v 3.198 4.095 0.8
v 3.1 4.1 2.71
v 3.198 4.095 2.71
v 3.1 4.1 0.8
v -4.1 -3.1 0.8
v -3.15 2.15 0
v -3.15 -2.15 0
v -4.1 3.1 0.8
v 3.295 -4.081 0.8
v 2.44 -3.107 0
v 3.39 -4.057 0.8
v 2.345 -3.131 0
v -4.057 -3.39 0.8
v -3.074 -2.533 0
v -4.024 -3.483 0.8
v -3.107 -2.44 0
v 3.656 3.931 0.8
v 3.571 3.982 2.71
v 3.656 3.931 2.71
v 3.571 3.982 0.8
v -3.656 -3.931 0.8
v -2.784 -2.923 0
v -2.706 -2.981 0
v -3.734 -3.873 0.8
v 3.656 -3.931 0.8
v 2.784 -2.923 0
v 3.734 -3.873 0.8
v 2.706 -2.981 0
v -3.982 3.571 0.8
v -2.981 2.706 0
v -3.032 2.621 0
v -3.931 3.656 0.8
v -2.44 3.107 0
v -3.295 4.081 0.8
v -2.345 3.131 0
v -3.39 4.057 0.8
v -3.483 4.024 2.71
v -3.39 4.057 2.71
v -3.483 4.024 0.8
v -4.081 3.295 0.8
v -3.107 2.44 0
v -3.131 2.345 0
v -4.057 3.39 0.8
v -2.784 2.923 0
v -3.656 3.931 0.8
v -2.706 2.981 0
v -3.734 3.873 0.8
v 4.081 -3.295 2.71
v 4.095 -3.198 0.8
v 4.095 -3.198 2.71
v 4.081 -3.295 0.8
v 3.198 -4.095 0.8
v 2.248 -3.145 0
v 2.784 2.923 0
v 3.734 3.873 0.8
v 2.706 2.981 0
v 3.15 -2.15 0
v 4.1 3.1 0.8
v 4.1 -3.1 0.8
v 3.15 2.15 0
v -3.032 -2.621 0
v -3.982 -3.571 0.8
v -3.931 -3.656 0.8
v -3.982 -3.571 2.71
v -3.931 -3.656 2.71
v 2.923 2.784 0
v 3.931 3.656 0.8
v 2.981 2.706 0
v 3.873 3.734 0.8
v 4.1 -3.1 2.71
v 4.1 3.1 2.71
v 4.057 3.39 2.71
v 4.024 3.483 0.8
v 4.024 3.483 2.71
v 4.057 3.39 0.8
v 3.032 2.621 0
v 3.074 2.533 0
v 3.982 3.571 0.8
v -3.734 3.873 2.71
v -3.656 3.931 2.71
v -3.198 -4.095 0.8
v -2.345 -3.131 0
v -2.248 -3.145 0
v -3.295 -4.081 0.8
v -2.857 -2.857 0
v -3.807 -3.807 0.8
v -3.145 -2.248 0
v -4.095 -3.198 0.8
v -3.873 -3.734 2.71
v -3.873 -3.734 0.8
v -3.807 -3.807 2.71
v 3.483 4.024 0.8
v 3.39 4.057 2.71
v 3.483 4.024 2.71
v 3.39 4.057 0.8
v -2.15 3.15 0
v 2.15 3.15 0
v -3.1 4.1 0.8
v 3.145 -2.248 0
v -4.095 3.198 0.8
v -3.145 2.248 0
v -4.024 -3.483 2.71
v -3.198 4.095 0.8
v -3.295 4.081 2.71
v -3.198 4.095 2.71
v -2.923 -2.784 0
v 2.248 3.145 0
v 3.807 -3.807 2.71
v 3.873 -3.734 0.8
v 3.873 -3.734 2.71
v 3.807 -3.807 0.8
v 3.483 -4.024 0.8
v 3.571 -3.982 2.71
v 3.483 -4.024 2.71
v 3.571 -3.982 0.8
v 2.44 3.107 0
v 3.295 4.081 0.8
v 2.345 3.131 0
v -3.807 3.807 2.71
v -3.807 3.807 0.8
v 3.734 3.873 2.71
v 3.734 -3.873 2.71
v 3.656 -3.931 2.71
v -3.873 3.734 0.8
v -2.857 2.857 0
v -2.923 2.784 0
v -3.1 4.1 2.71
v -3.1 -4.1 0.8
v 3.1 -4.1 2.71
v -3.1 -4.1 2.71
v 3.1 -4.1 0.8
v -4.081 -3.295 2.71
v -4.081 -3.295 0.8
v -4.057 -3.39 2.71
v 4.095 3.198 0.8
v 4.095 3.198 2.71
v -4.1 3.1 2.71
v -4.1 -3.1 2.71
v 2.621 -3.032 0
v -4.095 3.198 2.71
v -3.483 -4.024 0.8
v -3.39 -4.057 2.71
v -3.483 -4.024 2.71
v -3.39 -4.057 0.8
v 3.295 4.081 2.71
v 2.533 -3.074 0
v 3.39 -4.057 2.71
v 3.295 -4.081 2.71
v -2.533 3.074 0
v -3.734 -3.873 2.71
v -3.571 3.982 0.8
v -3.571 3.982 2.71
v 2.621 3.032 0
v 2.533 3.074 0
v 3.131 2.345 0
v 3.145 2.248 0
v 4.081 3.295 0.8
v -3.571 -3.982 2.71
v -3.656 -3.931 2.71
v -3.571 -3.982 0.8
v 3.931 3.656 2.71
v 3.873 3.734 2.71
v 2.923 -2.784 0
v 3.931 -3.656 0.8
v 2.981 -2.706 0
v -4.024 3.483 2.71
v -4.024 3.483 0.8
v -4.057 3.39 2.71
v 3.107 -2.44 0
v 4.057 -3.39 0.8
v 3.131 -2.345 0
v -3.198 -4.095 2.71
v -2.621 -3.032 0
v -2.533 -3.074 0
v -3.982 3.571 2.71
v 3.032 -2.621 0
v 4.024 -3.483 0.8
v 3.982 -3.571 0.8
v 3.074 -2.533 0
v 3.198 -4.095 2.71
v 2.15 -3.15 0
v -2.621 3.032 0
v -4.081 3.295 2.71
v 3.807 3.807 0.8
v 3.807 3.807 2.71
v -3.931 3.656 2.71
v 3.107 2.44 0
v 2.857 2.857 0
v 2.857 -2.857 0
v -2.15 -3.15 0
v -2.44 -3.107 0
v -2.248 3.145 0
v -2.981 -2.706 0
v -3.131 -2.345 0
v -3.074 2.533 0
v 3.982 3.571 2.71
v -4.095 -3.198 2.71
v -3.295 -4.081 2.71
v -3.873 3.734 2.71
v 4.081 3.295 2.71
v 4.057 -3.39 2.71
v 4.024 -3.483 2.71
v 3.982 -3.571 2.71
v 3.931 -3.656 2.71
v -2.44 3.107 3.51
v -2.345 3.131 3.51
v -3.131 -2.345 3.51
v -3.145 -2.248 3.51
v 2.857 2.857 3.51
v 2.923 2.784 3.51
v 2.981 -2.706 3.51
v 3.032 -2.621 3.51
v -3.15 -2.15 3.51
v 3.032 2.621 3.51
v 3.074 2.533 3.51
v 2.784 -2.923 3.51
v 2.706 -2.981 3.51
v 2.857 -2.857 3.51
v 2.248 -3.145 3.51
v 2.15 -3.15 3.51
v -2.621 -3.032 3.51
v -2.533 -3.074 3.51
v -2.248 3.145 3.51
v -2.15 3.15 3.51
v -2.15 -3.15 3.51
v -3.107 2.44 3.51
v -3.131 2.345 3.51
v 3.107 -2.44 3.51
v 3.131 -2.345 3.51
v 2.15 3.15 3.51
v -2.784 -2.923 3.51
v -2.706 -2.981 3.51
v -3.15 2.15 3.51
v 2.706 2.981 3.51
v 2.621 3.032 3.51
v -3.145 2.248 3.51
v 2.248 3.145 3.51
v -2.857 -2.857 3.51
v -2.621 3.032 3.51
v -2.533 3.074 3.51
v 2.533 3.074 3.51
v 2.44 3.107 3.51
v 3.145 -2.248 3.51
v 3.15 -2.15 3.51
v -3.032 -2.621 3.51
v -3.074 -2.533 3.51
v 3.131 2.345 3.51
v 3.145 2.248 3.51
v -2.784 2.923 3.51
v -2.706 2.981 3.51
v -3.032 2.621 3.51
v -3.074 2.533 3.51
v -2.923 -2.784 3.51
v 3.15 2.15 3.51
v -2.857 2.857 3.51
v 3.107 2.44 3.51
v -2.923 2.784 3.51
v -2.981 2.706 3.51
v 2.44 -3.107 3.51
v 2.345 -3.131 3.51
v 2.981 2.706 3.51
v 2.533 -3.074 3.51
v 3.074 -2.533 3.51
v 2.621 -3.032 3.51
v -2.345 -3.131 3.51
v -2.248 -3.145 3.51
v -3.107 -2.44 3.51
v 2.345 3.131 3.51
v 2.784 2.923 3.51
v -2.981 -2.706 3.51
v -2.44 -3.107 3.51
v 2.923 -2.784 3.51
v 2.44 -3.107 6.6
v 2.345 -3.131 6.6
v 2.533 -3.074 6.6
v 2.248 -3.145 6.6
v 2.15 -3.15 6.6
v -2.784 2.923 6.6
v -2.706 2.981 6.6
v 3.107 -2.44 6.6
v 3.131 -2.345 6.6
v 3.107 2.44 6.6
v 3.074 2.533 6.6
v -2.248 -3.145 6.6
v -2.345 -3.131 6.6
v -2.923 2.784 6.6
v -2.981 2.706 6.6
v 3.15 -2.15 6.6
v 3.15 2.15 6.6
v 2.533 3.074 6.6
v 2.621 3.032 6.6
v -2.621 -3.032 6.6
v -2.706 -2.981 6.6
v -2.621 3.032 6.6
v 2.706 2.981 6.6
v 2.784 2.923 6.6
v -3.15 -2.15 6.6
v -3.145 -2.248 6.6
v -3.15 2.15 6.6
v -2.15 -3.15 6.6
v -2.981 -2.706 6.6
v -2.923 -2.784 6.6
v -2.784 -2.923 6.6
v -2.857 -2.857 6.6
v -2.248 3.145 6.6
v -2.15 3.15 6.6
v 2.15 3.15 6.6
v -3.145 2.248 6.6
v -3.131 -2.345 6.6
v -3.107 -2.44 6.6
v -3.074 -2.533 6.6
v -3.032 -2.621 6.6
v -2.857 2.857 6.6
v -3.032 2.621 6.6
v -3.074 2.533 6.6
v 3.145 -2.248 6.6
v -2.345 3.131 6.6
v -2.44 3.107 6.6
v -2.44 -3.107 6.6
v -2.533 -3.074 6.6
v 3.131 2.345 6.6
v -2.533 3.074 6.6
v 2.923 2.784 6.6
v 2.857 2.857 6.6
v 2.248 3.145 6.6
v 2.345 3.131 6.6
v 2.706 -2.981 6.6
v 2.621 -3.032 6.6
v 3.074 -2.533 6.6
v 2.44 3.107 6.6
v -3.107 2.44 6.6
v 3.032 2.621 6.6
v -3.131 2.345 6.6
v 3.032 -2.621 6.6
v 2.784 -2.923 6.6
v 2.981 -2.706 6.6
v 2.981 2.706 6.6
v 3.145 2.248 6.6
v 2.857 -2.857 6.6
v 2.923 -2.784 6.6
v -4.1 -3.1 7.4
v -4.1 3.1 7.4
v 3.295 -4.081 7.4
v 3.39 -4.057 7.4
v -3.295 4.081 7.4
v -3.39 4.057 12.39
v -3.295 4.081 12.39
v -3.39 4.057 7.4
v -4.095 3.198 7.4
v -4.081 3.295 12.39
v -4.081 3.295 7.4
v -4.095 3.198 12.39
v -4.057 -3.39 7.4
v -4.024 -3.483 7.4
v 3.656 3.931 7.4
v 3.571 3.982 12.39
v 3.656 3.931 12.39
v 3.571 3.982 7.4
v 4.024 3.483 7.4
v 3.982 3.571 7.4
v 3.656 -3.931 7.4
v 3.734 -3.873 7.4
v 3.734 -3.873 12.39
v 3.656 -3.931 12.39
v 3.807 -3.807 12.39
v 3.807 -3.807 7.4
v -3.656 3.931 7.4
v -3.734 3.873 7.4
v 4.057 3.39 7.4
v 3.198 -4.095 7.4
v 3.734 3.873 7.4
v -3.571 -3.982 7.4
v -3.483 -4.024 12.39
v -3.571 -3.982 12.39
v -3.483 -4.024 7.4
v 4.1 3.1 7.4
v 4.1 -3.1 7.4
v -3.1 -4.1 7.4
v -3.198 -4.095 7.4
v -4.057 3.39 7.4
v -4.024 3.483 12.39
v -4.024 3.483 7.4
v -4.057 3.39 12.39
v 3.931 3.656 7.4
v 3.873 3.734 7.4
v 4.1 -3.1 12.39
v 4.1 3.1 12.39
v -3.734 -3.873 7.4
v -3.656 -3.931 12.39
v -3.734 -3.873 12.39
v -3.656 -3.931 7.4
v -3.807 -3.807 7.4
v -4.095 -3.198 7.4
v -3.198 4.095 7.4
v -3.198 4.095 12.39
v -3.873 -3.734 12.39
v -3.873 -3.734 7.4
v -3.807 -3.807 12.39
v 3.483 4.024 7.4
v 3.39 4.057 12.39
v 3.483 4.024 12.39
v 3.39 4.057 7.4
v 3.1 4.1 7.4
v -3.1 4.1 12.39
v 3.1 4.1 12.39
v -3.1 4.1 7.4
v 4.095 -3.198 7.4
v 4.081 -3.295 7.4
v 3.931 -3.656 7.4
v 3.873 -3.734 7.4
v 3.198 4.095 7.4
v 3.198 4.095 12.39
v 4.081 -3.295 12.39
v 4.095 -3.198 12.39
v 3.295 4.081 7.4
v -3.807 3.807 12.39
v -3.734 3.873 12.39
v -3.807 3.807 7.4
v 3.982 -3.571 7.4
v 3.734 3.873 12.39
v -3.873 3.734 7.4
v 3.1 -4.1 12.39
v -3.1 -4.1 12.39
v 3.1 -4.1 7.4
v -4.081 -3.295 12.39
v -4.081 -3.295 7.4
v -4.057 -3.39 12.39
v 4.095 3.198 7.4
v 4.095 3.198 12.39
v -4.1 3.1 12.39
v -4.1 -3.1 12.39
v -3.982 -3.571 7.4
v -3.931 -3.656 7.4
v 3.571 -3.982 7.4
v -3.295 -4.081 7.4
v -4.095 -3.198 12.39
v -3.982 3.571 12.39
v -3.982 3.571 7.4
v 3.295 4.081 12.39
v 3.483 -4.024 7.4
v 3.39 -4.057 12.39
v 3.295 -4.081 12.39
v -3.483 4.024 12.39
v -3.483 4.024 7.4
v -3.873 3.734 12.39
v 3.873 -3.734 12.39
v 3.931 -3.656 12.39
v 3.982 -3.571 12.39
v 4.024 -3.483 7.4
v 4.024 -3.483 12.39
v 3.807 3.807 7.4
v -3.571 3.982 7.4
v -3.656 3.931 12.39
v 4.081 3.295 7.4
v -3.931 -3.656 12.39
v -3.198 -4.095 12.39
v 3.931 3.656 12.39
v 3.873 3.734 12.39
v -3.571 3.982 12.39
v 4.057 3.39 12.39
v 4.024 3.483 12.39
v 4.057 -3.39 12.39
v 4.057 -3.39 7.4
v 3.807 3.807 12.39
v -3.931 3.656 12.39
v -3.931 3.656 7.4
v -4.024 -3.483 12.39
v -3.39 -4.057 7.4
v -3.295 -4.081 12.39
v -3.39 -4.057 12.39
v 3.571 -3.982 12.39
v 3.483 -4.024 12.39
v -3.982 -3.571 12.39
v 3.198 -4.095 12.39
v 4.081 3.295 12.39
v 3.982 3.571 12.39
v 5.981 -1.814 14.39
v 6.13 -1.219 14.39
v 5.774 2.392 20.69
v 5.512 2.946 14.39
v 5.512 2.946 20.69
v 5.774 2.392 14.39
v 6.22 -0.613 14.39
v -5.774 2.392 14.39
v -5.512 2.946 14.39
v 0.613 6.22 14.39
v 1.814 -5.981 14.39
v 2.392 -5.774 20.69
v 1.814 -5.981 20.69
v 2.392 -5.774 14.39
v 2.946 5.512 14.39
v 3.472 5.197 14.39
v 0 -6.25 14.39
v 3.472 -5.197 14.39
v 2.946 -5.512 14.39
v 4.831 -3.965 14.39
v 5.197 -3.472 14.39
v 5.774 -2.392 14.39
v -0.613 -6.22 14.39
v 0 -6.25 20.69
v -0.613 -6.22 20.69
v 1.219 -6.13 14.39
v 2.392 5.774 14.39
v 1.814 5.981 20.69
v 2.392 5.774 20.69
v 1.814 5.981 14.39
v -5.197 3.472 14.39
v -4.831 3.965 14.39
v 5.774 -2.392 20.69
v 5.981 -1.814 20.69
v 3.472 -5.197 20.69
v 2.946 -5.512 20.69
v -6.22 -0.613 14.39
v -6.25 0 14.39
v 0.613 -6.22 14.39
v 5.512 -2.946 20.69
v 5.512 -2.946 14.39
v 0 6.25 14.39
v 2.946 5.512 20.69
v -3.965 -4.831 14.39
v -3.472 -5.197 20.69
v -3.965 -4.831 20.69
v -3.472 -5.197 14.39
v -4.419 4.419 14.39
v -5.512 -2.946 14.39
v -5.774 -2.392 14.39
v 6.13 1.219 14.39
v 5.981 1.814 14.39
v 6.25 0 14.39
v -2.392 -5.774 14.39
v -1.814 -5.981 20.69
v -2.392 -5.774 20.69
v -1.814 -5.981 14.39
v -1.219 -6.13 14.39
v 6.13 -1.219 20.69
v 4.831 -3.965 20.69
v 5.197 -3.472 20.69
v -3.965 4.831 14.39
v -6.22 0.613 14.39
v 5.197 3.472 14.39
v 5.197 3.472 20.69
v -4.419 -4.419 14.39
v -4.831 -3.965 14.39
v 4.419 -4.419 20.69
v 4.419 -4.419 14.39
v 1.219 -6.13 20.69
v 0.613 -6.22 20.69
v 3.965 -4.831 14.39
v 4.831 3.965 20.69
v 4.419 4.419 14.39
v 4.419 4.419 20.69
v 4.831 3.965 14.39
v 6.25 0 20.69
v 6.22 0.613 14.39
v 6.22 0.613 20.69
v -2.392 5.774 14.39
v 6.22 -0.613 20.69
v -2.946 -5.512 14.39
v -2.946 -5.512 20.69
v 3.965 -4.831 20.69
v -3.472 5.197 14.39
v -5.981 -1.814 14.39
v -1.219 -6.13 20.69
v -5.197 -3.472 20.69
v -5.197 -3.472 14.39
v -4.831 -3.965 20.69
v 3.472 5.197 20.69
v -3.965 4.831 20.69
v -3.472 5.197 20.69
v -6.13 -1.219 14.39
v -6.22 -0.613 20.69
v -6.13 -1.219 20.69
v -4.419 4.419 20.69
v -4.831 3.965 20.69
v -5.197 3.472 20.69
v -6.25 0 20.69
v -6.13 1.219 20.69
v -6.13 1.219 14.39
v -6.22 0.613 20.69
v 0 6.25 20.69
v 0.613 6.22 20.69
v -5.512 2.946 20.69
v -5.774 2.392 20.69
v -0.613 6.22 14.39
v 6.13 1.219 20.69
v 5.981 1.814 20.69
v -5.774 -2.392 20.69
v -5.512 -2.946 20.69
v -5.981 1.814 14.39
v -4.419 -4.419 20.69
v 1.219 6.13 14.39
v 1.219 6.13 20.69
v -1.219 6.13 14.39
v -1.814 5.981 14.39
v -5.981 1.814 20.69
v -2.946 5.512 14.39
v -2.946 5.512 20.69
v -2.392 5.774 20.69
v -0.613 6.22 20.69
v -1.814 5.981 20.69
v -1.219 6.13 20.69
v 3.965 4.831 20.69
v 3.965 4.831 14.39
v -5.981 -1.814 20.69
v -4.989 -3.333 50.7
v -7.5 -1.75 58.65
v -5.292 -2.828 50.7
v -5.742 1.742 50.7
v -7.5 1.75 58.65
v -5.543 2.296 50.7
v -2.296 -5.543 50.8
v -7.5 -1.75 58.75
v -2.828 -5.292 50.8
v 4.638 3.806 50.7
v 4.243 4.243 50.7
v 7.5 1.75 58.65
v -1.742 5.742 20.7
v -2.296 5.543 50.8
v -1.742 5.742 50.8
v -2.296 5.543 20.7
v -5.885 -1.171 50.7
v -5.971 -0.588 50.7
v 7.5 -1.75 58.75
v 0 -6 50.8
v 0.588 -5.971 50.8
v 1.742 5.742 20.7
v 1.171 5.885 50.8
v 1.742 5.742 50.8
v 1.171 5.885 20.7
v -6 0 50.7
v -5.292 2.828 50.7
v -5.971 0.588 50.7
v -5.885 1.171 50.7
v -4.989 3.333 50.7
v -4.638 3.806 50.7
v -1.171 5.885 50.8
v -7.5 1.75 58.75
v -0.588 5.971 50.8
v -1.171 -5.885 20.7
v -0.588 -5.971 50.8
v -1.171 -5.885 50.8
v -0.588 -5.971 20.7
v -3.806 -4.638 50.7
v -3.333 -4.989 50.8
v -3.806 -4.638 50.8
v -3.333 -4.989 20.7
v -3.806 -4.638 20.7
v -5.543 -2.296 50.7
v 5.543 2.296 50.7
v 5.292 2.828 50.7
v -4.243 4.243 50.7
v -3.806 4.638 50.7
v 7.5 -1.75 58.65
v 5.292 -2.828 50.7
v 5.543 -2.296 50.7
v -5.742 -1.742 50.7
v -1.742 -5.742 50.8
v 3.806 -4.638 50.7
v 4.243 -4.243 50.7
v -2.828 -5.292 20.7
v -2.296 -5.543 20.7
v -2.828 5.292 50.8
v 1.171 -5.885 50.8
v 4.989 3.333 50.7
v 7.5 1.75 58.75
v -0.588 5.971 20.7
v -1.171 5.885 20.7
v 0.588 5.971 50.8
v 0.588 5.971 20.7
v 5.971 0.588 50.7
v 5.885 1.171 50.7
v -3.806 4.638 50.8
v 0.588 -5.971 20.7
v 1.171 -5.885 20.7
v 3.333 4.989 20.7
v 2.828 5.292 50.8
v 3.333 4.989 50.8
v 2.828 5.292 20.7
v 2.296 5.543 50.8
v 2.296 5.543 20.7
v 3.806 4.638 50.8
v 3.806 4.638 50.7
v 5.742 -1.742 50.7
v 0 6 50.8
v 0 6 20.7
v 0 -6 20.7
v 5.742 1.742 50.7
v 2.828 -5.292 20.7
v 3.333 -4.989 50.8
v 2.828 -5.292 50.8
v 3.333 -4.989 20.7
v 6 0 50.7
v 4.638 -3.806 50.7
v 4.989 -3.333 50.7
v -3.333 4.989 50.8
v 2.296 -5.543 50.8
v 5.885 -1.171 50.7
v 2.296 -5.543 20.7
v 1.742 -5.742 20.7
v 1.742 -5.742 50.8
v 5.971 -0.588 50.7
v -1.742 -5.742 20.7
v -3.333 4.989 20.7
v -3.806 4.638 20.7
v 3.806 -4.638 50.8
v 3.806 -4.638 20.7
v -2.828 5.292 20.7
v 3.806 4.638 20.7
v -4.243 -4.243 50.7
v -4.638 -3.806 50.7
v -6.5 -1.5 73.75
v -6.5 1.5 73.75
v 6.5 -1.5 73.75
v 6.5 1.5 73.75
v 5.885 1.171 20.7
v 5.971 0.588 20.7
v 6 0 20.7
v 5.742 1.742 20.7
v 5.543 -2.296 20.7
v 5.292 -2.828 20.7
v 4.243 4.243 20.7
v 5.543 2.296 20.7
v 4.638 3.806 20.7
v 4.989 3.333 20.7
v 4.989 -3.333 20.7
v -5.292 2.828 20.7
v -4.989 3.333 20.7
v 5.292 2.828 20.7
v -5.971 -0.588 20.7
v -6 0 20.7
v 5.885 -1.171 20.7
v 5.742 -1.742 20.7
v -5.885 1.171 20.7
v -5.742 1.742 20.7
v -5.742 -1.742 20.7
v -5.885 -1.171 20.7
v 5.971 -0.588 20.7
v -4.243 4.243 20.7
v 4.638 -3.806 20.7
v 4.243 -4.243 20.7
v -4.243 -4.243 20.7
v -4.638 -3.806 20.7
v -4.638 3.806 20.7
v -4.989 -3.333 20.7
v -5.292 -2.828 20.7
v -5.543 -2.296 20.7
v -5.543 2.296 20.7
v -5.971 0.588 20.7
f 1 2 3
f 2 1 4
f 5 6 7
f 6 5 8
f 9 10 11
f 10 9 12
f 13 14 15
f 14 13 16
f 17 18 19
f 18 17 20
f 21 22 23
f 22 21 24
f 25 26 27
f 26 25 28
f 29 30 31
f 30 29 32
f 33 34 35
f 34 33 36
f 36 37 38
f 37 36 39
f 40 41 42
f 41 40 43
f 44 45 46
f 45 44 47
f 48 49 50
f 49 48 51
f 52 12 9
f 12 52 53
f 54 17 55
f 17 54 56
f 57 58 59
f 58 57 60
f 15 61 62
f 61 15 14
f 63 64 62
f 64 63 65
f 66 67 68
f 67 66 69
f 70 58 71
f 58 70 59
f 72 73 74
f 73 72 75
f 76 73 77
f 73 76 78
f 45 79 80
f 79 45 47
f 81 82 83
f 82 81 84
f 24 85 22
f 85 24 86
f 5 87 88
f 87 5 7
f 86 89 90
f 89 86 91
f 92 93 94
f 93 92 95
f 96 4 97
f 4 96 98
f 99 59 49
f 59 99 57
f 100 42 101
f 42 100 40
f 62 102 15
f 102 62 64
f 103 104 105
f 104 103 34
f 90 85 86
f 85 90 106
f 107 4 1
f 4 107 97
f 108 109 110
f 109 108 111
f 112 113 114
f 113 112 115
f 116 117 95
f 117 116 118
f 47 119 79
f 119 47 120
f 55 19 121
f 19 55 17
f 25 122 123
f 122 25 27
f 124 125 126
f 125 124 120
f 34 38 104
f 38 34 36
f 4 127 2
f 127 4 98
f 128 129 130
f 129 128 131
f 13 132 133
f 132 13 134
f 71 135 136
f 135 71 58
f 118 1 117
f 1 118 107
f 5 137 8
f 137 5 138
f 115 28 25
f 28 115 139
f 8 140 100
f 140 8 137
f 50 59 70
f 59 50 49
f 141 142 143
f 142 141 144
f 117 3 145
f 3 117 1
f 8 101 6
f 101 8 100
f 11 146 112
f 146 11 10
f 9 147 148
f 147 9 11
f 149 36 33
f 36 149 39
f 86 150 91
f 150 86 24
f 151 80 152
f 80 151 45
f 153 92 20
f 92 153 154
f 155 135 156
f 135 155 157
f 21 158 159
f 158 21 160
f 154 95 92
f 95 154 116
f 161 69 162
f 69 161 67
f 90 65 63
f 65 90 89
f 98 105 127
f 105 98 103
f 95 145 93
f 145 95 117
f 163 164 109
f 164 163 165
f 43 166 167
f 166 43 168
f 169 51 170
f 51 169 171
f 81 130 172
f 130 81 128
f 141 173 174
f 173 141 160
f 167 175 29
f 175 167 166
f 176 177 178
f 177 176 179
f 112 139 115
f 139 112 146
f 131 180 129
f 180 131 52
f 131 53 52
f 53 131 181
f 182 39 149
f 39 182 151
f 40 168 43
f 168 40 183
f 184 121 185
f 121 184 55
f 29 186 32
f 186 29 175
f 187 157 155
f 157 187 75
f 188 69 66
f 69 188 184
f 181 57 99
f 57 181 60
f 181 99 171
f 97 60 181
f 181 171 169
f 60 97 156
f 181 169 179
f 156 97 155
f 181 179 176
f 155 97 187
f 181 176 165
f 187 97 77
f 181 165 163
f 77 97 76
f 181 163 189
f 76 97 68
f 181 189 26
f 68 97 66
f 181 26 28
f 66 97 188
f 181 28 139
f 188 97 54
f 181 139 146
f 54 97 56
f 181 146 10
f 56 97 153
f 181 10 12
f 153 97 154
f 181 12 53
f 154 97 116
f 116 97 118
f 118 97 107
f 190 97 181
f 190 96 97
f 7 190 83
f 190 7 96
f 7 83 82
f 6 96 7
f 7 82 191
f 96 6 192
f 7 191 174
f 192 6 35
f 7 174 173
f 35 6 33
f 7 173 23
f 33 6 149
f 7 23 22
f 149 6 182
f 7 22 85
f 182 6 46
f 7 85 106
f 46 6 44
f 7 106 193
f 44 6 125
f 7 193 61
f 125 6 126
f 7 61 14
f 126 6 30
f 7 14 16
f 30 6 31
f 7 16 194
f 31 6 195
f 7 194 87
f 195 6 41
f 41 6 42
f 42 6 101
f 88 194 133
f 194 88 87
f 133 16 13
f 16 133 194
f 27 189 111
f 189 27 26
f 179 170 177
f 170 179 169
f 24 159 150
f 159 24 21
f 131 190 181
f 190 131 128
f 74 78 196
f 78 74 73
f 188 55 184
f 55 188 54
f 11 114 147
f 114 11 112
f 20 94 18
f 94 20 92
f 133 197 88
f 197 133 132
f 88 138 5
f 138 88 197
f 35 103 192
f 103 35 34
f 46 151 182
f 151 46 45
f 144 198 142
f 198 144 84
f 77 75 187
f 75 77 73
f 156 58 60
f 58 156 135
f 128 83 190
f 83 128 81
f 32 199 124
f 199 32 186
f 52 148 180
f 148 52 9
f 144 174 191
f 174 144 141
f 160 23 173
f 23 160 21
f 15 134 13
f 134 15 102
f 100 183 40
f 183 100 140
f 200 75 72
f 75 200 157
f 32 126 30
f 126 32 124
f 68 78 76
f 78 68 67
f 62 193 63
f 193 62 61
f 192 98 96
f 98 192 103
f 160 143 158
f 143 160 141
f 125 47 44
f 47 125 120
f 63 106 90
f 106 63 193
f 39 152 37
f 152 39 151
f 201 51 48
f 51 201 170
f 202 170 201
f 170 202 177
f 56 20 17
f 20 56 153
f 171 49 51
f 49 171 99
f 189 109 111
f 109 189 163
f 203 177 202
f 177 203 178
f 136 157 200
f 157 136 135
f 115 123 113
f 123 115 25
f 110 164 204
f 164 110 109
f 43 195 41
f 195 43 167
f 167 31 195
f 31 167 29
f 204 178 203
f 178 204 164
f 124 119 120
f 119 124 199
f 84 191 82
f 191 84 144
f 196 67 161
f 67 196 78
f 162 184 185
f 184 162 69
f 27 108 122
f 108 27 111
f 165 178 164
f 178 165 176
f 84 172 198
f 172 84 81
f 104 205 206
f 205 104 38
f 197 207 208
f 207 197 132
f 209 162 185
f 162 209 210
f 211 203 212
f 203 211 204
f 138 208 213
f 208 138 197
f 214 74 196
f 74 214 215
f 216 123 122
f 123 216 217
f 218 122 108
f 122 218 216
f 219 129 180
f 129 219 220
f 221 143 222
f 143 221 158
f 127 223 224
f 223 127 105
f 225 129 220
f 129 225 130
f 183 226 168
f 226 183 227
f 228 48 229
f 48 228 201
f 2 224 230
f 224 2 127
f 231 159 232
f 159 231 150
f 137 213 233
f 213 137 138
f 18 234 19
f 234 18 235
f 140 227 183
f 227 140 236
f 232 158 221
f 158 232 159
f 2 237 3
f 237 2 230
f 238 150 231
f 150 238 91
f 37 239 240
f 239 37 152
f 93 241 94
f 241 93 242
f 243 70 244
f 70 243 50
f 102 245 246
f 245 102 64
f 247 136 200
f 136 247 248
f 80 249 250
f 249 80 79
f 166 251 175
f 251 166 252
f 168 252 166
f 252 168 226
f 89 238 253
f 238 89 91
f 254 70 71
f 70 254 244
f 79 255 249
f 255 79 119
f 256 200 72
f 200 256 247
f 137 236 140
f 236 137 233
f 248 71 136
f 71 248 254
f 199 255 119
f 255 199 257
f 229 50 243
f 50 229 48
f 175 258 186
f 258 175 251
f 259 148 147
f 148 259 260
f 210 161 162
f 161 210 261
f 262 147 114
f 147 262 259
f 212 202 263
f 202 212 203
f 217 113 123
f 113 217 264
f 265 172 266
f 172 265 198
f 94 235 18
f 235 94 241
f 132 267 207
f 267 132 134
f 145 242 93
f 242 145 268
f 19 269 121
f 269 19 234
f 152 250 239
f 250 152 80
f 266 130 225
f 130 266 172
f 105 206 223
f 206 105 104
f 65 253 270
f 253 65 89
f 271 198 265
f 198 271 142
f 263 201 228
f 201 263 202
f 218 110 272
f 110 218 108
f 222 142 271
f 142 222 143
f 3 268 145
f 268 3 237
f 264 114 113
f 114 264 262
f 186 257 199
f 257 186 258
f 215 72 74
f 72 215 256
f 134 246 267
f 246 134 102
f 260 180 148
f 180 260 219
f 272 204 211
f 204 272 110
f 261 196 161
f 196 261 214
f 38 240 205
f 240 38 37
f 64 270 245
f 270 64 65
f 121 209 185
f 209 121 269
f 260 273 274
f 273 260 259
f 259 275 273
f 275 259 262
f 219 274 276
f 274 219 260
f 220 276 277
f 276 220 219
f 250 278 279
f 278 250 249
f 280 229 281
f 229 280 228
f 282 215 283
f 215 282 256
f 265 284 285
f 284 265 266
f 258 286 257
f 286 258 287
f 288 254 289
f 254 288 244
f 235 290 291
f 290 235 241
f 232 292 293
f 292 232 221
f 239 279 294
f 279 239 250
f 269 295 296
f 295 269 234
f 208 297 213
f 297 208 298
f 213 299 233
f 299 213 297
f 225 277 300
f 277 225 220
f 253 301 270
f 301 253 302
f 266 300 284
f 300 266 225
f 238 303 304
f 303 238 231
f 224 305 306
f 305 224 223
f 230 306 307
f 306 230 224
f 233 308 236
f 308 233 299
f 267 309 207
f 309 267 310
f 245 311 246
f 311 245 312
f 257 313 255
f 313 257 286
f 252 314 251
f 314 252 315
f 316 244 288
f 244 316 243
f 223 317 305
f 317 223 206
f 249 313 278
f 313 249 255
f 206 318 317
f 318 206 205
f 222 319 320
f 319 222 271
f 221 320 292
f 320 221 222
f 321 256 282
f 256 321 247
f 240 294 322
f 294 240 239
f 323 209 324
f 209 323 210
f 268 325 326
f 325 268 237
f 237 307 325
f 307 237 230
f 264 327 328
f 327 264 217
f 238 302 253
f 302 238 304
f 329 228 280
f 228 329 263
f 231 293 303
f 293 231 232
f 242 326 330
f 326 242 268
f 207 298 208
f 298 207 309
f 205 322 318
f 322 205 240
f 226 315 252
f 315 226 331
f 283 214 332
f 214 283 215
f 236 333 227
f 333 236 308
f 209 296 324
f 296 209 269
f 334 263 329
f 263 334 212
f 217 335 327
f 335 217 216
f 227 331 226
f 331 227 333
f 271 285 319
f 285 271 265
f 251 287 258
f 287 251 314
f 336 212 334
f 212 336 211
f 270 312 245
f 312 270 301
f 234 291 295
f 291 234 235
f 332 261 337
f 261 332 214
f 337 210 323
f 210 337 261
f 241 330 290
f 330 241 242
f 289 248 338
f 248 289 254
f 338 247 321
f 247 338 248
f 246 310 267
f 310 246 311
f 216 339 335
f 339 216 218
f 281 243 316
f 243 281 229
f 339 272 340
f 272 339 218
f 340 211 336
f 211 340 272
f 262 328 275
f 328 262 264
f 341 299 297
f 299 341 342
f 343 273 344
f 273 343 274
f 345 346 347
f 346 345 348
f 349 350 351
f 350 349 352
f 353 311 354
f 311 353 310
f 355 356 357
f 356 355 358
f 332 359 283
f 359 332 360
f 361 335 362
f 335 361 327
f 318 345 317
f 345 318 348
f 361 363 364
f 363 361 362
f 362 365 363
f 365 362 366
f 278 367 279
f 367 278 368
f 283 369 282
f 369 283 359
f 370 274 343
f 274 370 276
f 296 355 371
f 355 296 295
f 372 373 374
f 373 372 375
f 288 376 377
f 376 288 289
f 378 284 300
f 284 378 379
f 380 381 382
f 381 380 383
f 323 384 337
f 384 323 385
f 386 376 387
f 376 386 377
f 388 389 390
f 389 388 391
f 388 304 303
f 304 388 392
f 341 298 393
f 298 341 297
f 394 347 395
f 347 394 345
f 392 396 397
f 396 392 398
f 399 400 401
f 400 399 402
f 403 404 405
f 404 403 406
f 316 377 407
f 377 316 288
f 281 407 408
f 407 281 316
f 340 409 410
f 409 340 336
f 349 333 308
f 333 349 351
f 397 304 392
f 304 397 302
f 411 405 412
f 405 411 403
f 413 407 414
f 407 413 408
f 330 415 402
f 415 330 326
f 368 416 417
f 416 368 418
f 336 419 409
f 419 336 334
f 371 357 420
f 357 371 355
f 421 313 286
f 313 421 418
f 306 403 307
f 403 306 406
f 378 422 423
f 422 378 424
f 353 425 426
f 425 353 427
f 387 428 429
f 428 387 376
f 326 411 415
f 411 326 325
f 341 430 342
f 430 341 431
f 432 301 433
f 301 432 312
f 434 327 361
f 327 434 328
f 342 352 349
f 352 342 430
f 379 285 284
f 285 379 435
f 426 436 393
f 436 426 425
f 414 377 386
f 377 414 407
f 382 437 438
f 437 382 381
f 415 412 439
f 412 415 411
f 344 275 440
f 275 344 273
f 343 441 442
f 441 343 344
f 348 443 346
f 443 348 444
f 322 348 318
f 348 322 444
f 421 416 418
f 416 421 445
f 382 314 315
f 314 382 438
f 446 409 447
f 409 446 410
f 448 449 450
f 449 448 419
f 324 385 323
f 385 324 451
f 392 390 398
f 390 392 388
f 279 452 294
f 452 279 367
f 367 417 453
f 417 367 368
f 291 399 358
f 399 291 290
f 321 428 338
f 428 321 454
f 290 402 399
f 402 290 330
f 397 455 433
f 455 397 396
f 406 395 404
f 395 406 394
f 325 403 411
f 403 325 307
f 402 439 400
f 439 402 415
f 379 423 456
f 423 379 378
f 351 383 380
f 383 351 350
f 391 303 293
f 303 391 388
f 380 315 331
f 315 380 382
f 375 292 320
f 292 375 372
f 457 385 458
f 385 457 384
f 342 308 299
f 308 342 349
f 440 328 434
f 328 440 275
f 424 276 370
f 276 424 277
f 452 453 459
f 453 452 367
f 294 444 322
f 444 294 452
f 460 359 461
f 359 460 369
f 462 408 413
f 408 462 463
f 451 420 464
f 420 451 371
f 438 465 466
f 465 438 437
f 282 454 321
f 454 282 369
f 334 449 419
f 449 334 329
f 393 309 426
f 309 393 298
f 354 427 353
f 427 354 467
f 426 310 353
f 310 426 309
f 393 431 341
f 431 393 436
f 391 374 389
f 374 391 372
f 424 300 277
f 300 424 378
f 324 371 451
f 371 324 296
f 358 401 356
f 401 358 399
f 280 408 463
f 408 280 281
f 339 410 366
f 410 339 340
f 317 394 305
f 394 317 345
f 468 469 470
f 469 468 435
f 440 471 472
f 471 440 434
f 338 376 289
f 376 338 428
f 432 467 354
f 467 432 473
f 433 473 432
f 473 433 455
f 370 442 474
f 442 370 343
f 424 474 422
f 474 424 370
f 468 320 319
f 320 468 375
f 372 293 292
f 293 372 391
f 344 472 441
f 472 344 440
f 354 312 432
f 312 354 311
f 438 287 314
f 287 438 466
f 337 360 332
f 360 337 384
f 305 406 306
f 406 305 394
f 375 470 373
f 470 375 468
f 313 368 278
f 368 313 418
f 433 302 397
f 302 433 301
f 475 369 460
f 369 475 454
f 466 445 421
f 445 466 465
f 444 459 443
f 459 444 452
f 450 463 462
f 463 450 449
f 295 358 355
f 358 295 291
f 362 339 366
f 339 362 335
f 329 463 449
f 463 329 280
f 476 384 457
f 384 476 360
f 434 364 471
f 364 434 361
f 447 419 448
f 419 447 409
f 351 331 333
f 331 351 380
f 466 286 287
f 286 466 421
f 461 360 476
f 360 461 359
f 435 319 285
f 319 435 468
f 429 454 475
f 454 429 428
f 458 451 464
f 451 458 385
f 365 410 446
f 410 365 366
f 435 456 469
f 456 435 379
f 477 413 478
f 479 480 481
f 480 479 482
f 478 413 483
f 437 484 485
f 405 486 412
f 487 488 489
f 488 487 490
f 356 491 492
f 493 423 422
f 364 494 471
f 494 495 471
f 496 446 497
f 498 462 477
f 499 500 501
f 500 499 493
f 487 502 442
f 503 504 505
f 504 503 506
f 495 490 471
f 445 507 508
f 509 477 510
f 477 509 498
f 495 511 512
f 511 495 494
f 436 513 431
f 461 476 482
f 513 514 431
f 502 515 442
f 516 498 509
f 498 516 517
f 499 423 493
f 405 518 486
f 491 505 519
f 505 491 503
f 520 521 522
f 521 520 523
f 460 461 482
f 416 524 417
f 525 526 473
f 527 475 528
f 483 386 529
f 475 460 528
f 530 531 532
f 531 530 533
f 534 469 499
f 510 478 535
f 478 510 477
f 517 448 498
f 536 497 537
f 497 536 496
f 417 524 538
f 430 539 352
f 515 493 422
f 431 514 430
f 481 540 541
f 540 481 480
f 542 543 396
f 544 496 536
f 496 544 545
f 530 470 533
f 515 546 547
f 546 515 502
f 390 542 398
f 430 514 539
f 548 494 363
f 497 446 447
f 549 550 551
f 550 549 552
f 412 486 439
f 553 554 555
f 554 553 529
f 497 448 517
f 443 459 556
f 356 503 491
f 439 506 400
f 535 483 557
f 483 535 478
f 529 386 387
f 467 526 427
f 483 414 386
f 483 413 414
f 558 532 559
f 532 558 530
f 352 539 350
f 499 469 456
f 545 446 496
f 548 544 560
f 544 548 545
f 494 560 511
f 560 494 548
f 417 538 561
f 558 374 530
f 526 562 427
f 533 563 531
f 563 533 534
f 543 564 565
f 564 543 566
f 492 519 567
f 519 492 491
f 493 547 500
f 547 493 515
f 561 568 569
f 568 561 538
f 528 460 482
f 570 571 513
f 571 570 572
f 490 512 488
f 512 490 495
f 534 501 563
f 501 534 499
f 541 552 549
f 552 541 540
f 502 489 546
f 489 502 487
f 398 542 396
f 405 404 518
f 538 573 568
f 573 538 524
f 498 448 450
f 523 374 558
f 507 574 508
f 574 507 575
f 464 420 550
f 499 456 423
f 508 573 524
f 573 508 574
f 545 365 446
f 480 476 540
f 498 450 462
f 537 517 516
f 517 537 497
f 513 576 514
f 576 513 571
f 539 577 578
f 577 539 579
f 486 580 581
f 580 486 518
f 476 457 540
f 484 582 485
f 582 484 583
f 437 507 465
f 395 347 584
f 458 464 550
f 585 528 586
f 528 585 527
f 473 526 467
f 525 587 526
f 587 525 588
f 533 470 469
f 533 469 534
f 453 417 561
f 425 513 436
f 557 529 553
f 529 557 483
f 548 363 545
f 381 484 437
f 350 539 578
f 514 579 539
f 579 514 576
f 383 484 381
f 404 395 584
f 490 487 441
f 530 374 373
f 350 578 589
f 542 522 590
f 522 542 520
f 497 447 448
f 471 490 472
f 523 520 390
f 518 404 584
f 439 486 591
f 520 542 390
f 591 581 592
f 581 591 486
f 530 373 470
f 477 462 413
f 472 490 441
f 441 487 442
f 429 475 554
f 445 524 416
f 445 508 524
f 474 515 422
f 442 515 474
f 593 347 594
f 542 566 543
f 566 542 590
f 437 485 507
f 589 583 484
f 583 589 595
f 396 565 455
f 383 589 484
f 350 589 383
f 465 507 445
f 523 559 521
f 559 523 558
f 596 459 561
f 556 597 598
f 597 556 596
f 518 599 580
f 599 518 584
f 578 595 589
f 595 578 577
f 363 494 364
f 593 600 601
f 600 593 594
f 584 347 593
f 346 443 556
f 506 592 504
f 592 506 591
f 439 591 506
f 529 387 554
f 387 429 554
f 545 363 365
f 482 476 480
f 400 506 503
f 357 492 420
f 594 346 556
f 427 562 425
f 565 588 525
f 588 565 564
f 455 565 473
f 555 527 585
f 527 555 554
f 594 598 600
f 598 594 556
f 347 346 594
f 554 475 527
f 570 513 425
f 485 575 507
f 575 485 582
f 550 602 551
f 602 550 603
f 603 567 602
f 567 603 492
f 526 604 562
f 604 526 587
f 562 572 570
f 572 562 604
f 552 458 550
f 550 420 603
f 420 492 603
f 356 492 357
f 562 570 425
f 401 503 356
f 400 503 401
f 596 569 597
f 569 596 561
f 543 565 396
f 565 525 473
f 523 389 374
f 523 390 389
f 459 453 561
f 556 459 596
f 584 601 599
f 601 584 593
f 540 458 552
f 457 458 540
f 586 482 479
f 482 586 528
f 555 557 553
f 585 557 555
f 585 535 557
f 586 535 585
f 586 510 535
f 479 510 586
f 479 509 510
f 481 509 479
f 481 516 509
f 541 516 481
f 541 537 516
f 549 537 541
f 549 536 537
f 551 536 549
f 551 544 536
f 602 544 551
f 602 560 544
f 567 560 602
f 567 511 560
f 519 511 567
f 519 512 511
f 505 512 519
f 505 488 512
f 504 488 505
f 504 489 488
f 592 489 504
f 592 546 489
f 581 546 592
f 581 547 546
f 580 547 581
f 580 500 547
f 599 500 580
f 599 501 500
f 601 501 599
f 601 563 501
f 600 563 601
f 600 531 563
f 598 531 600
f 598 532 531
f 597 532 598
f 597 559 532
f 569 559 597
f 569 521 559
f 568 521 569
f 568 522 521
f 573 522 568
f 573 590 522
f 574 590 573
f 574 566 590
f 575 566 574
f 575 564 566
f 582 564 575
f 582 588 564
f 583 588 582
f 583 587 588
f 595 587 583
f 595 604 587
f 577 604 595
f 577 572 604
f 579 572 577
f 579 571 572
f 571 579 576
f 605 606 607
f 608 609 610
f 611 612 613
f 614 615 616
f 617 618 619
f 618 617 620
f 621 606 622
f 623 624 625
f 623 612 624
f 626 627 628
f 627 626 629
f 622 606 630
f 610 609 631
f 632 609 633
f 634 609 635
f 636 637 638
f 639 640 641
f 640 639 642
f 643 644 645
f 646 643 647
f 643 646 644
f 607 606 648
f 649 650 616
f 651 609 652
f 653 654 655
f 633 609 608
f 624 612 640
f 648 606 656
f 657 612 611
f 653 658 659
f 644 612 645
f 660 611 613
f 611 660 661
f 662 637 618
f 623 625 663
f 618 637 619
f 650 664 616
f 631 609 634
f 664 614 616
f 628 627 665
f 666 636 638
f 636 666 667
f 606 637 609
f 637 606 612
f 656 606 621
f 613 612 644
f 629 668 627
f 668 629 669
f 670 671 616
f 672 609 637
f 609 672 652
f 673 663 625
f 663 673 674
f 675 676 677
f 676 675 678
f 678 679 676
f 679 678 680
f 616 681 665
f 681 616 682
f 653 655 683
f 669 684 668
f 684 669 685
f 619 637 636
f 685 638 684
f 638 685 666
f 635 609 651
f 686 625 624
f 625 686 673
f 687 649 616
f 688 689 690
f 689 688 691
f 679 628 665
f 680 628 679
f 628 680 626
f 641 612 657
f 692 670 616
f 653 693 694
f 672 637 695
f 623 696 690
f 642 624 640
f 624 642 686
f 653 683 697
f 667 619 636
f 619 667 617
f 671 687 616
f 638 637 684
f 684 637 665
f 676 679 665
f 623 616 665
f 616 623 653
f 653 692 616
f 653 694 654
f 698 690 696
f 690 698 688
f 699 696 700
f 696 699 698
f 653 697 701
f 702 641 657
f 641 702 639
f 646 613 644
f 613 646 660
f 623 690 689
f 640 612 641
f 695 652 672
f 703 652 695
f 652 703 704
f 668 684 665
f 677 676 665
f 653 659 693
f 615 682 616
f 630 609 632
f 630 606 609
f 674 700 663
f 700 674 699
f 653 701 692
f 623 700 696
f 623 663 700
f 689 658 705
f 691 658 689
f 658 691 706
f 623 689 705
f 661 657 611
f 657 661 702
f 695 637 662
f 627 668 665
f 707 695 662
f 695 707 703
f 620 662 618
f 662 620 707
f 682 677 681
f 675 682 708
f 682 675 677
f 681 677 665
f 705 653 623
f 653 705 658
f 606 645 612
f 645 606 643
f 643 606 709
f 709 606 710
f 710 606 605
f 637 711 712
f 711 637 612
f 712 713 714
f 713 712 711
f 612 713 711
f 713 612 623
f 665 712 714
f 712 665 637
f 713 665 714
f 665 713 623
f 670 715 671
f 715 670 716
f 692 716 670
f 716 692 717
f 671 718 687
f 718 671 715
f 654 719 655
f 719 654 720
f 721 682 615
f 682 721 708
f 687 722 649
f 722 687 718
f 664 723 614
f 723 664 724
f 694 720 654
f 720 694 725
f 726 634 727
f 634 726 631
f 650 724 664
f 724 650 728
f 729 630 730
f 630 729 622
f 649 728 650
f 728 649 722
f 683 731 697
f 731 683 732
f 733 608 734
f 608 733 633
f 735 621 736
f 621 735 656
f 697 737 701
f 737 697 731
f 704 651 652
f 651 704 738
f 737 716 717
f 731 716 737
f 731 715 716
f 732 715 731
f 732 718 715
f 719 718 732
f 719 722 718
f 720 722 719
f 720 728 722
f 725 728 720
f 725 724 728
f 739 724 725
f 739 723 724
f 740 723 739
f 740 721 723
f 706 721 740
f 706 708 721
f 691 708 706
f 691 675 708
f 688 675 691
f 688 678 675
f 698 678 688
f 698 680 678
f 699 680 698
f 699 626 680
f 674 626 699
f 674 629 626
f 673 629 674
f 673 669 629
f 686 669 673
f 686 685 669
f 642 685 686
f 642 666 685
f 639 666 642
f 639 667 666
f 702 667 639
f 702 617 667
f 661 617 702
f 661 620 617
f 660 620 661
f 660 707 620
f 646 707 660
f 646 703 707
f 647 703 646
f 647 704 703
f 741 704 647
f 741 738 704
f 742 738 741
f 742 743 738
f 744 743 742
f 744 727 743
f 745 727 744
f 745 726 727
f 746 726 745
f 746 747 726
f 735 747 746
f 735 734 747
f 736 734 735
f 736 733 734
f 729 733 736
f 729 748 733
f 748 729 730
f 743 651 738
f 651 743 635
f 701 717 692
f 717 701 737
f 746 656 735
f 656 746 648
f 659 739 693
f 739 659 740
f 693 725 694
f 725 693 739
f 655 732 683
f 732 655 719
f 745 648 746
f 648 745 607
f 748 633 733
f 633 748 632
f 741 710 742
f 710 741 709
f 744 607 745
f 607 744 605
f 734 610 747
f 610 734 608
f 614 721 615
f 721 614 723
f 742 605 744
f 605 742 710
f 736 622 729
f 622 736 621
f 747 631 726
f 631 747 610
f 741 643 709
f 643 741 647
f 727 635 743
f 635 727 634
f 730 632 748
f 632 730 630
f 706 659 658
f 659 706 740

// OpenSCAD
// file: _connection.scad
// =====================================
// Fisher-Price Power Workshop - Shared Connection
// Common square-peg connection shared by all attachments
// See CONNECTION_SPEC.md for measurement details
// =====================================

// ---- Connection Parameters (mm) ----

// Square shaft (male end - plugs into handle)
// Measured from calipers on existing attachment
shaft_sq = 8.2;          // side length
shaft_sq_length = 12.4;  // total length of square shaft (3.5 + 3.1 + 5.8)

// Snap groove in the square shaft
groove_pos = 3.5 + 3.1/2;   // from tip (z=0) to groove center
groove_width = 3.1;      // width of the groove
groove_depth = 0.95;     // per side: (8.2 - 6.3) / 2
groove_bevel = 0.8;      // taper height at each end of groove
tip_bevel = 0.8;         // taper height at tip for insertion guide
corner_r = 1.0;          // corner rounding radius on male shaft (mimics injection-molded originals)

// Transition collar
collar_diameter = 12.5;  // measured
collar_length = 8.3;     // measured
collar_bevel = 2.0;      // taper from square shaft to round collar

// Square socket (female end - accepts male shaft)
// Sized to accept shaft with clearance
socket_size = 8.6;      // side length (+0.4mm clearance over 8.2mm shaft)
socket_depth = 13;      // depth of square socket (accepts 12.4mm shaft)
socket_lead_in = 1.2;   // chamfer depth at the opening to reduce catching

// Snap ridge inside socket (mates with groove on attachments)
ridge_pos = 7.35;       // from opening; aligns with groove when shaft inserted
ridge_width = 3.1;      // matches groove width
ridge_depth = 0.95;     // matches groove depth
ridge_bevel = 0.8;      // taper height at each end of ridge (matches groove_bevel)

// ---- Connection Modules ----

// 2D profile for corner-only snap ridge.
// Intersecting the socket square with a 45-degree-rotated square creates an
// octagon — material protrudes only at the four corners, allowing the shaft
// to push past with moderate force while still snapping into the groove for
// retention.
module _ridge_profile() {
    intersection() {
        square(socket_size, center=true);
        rotate([0, 0, 45])
            square(socket_size * sqrt(2) - ridge_depth * 2, center=true);
    }
}

// 2D rounded-square profile for male shaft cross-sections.
// Shrinks inward then rounds back outward so the result is the same side
// length with corners rounded at corner_r radius.
module _shaft_profile(size) {
    offset(r = corner_r) offset(delta = -corner_r)
        square(size, center = true);
}

// Square plug shaft with snap groove and beveled transitions
module sq_shaft() {
    groove_start = groove_pos - groove_width/2;
    groove_end = groove_pos + groove_width/2;
    groove_sq = shaft_sq - groove_depth * 2;

    // Tip bevel (matches groove transition style)
    hull() {
        linear_extrude(0.01)
            _shaft_profile(groove_sq);
        translate([0, 0, tip_bevel])
            linear_extrude(0.01)
                _shaft_profile(shaft_sq);
    }

    // Remaining tip section
    translate([0, 0, tip_bevel])
        linear_extrude(groove_start - groove_bevel - tip_bevel)
            _shaft_profile(shaft_sq);

    // Bevel into groove
    hull() {
        translate([0, 0, groove_start - groove_bevel])
            linear_extrude(0.01)
                _shaft_profile(shaft_sq);
        translate([0, 0, groove_start])
            linear_extrude(0.01)
                _shaft_profile(groove_sq);
    }

    // Groove
    translate([0, 0, groove_start])
        linear_extrude(groove_width)
            _shaft_profile(groove_sq);

    // Bevel out of groove
    hull() {
        translate([0, 0, groove_end])
            linear_extrude(0.01)
                _shaft_profile(groove_sq);
        translate([0, 0, groove_end + groove_bevel])
            linear_extrude(0.01)
                _shaft_profile(shaft_sq);
    }

    // Main shaft
    translate([0, 0, groove_end + groove_bevel])
        linear_extrude(shaft_sq_length - groove_end - groove_bevel)
            _shaft_profile(shaft_sq);
}

// Square socket with snap ridge and beveled transitions
// Includes a chamfered lead-in at the opening to reduce insertion catching
module square_socket() {
    ridge_start = ridge_pos - ridge_width/2;
    ridge_end = ridge_pos + ridge_width/2;

    // Lead-in chamfer at opening — wider at the entrance, tapers to socket_size at depth
    translate([0, 0, -0.1])
        linear_extrude(socket_lead_in + 0.1, scale = socket_size / (socket_size + 0.8))
            square(socket_size + 0.8, center = true);

    // Below ridge (full-size socket)
    translate([0, 0, socket_lead_in])
        linear_extrude(ridge_start - ridge_bevel - socket_lead_in)
            square(socket_size, center = true);

    // Bevel into ridge
    hull() {
        translate([0, 0, ridge_start - ridge_bevel])
            linear_extrude(0.01)
                square(socket_size, center = true);
        translate([0, 0, ridge_start])
            linear_extrude(0.01)
                _ridge_profile();
    }

    // Ridge section (corner-only octagonal profile)
    translate([0, 0, ridge_start])
        linear_extrude(ridge_width)
            _ridge_profile();

    // Bevel out of ridge
    hull() {
        translate([0, 0, ridge_end])
            linear_extrude(0.01)
                _ridge_profile();
        translate([0, 0, ridge_end + ridge_bevel])
            linear_extrude(0.01)
                square(socket_size, center = true);
    }

    // Above ridge to full depth
    translate([0, 0, ridge_end + ridge_bevel])
        linear_extrude(socket_depth - ridge_end - ridge_bevel + 0.1)
            square(socket_size, center = true);
}

// Transition collar with beveled square-to-round base
module collar() {
    translate([0, 0, shaft_sq_length - 0.01]) {  // -0.01mm overlap with shaft top prevents coplanar faces
        // Taper from square shaft to round collar
        hull() {
            linear_extrude(0.01)
                _shaft_profile(shaft_sq);
            translate([0, 0, collar_bevel])
                cylinder(d = collar_diameter, h = 0.01);
        }
        // Remaining collar
        translate([0, 0, collar_bevel])
            cylinder(d = collar_diameter, h = collar_length - collar_bevel);
    }
}
// main file
// =====================================
// Fisher-Price Power Workshop - Flathead Screwdriver Attachment
// Plugs into power handle or screwdriver handle
// =====================================

// ---- Parameters (mm) ----
$fn = 64;
include <_connection.scad>

// Shaft between square peg and blade
shaft_diameter = 12;
shaft_length = 30;       // visible shaft length

// Flathead blade
blade_width = 15;       // width of the flat blade
blade_thickness = 3.5;  // thickness of flat blade
blade_length = 15;      // how far the blade extends
blade_taper = 8;        // length of taper from shaft to blade

// Total length approx: hex_length + collar_length + shaft_length + blade_taper + blade_length

// ---- Modules ----

// Round shaft
module shaft() {
    translate([0, 0, shaft_sq_length + collar_length])
        cylinder(d = shaft_diameter, h = shaft_length);
}

// Flathead blade with taper
module flathead_blade() {
    tip_start = shaft_sq_length + collar_length + shaft_length;

    // Taper from round shaft to flat blade
    translate([0, 0, tip_start])
    hull() {
        // Base matches shaft
        cylinder(d = shaft_diameter, h = 0.1);
        // Tip is flat
        translate([0, 0, blade_taper])
            cube([blade_width, blade_thickness, 0.1], center = true);
    }

    // Flat blade extension
    translate([0, 0, tip_start + blade_taper])
    hull() {
        cube([blade_width, blade_thickness, 0.1], center = true);
        // Slight taper at very tip
        translate([0, 0, blade_length])
            cube([blade_width - 2, blade_thickness - 0.5, 0.1], center = true);
    }
}

// ---- Assembly ----
union() {
    sq_shaft();
    collar();
    shaft();
    flathead_blade();
}
